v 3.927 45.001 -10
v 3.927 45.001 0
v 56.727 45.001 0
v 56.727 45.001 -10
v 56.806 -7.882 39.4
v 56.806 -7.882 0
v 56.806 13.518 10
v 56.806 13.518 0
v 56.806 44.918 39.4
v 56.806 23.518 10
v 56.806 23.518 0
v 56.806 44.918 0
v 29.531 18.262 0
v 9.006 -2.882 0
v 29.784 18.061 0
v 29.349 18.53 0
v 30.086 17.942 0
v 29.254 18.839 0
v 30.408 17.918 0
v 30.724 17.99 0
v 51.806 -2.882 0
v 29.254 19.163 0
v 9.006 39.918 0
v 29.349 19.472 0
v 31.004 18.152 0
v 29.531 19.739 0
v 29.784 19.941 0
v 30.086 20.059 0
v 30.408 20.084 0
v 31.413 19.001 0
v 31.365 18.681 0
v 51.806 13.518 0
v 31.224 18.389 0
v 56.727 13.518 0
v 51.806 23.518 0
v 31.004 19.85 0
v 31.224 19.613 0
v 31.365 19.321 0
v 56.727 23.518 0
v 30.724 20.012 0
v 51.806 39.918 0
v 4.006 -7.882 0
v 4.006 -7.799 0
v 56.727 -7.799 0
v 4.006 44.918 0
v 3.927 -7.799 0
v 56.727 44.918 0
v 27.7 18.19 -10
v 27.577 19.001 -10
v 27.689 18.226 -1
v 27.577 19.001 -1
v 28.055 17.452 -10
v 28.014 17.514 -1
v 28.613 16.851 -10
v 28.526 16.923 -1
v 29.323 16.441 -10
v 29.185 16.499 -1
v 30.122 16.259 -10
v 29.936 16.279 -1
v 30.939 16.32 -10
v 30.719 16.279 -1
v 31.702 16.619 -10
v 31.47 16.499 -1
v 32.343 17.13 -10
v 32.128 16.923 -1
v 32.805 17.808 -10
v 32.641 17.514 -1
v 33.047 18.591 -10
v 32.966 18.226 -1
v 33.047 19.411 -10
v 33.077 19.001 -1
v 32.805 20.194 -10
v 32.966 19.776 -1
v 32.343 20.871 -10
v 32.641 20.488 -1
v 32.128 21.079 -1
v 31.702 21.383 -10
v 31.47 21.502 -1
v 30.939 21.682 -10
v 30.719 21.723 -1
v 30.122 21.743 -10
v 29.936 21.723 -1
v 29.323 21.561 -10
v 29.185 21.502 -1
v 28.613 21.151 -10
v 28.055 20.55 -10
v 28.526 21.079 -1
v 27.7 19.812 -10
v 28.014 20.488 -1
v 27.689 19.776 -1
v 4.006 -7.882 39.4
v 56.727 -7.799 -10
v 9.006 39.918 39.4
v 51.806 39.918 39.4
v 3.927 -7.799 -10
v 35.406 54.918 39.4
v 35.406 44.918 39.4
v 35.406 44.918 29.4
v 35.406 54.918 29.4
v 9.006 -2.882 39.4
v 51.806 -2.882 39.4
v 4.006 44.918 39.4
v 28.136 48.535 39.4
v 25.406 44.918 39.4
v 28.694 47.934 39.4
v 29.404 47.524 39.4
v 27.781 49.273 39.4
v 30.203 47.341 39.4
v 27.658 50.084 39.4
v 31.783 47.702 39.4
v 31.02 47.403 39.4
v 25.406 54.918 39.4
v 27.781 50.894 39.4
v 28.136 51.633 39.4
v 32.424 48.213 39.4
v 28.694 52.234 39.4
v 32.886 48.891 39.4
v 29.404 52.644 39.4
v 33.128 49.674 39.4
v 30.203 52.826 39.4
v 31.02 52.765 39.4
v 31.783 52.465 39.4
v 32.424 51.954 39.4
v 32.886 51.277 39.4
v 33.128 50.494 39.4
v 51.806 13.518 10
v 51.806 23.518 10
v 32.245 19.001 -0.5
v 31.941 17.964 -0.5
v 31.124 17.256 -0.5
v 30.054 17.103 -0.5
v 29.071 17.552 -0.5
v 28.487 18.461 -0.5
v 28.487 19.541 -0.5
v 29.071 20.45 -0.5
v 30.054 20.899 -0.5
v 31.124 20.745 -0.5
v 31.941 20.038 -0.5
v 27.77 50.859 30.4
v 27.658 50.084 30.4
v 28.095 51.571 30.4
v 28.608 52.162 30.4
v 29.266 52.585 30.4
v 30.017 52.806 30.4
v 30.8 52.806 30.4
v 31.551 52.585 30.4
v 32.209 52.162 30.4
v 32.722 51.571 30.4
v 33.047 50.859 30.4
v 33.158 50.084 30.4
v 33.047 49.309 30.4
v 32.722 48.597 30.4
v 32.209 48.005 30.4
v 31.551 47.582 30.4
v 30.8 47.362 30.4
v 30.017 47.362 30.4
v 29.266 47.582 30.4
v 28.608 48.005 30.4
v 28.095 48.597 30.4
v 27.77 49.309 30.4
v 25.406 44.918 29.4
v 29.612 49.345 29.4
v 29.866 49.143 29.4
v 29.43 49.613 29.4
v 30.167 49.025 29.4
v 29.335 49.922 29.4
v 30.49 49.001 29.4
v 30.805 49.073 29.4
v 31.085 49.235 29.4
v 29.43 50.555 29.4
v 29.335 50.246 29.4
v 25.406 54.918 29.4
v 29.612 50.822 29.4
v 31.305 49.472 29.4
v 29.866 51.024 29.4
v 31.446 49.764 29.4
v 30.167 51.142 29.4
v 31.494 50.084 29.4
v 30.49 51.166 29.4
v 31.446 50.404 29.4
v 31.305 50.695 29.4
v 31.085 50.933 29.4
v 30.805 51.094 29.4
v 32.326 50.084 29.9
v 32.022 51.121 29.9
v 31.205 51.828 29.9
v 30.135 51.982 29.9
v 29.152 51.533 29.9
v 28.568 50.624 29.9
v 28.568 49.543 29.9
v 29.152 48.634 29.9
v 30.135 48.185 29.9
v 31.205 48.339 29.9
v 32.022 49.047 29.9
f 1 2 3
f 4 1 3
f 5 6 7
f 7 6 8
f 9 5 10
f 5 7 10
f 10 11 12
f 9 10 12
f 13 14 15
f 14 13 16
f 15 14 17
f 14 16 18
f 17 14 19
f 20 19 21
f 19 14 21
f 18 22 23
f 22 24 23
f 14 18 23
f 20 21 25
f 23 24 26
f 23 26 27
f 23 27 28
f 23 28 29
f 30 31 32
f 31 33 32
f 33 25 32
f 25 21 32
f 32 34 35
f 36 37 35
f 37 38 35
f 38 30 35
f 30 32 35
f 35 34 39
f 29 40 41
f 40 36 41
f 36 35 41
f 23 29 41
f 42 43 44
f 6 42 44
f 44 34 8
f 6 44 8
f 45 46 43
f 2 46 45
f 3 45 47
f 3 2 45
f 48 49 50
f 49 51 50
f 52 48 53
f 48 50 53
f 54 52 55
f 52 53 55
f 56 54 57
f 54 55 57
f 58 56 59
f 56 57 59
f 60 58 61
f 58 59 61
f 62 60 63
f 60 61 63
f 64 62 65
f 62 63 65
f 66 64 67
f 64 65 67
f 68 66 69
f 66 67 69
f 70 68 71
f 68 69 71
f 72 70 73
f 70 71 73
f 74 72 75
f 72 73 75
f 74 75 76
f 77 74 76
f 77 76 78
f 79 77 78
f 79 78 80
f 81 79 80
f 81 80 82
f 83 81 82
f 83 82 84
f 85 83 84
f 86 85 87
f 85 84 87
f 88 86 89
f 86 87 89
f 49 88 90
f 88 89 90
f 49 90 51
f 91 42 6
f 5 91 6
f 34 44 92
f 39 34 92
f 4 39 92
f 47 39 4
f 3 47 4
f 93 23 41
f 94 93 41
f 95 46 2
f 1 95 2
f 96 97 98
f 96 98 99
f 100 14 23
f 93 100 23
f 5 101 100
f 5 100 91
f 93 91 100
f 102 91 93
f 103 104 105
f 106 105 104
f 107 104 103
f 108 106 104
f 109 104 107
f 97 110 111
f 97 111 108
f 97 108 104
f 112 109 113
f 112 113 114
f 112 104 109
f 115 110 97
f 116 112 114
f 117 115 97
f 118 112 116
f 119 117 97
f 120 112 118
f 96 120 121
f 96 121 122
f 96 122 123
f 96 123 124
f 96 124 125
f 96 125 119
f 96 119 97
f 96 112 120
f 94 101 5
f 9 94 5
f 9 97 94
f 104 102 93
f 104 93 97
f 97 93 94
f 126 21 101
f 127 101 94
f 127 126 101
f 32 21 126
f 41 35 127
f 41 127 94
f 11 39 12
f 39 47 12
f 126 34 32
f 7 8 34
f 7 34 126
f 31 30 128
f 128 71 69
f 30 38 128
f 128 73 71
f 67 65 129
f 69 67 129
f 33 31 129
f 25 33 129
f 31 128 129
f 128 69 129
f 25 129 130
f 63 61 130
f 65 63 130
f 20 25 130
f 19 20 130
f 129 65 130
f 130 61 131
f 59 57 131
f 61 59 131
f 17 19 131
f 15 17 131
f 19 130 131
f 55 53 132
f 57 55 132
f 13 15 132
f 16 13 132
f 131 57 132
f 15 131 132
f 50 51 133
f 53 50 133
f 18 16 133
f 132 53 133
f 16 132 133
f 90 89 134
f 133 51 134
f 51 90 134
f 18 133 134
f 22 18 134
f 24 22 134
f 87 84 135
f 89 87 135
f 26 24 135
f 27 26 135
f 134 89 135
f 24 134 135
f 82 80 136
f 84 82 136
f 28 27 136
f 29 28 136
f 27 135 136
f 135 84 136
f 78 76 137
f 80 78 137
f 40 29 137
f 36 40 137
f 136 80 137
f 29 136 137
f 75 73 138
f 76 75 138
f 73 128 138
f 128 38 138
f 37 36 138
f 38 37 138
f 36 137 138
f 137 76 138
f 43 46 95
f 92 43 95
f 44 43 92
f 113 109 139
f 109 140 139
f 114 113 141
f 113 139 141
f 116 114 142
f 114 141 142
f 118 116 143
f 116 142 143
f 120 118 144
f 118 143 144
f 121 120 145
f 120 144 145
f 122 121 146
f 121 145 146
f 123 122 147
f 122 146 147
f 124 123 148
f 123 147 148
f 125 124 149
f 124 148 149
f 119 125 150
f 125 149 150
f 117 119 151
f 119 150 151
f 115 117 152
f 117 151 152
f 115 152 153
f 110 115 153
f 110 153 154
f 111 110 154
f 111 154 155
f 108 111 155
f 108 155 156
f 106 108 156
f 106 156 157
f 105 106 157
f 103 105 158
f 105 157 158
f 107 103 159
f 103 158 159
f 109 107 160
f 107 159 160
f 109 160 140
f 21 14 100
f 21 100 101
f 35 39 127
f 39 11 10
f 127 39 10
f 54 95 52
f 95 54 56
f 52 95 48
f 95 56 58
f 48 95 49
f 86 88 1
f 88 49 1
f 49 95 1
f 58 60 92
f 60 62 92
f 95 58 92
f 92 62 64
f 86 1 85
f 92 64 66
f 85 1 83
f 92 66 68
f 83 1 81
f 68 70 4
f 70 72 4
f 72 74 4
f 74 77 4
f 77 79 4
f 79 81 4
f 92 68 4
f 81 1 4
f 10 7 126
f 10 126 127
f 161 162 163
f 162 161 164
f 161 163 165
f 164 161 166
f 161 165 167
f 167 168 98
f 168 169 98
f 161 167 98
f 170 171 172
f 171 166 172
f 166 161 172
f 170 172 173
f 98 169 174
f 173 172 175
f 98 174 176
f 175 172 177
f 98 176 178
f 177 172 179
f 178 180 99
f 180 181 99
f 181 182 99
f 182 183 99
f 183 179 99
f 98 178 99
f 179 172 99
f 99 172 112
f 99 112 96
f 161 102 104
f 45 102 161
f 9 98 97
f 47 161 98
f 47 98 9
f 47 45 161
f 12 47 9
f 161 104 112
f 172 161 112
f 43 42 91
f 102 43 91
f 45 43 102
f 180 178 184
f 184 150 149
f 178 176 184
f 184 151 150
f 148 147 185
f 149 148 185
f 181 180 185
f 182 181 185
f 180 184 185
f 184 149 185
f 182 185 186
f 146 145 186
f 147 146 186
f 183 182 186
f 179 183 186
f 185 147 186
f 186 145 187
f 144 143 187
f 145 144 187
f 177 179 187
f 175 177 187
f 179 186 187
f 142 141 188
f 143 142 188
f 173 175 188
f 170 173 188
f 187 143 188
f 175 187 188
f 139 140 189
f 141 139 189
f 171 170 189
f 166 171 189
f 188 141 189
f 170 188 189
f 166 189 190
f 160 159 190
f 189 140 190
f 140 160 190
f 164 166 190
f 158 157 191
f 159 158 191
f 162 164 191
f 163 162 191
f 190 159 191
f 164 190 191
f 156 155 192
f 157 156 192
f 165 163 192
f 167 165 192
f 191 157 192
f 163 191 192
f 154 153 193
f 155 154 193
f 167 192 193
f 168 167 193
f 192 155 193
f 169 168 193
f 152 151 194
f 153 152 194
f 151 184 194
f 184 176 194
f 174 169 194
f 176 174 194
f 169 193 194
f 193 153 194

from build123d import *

# Parameters (mm, degrees)
F0_W      = 52.8
F0_H      = 52.8
F0_W_2    = 42.8
F0_H_2    = 42.8
F1_DEPTH  = 39.4
F2_W      = 52.8
F2_H      = 52.8
F3_DEPTH  = 10
F4_W      = 10
F4_H      = 10
F5_DEPTH  = 25
F6_W      = 10
F6_H      = 10
F7_DEPTH  = 10
F9_D      = 5.5
F9_DEPTH  = 9
F9_TIP    = 1.6523667023
F11_D     = 5.5
F11_DEPTH = 9
F11_TIP   = 1.6523667023


with BuildPart() as f1:
    # F0 (on Top) → F1 (new body)
    with BuildSketch(Plane.XY):
        with Locations((30.4056062862, 18.5175239619)):
            Rectangle(F0_W, F0_H)
        with Locations((30.4056062862, 18.5175239619)):
            Rectangle(F0_W_2, F0_H_2, mode=Mode.SUBTRACT)
    extrude(amount=F1_DEPTH)

    # F2 (on Top) → F3 (join)
    with BuildSketch(Plane.XY):
        with Locations((30.3273436148, 18.6009341)):
            Rectangle(F2_W, F2_H)
    extrude(amount=-F3_DEPTH)

    # F4 (on face) → F5 (cut)
    with BuildSketch(Plane.YZ.offset(56.8056062862)):
        with Locations((18.5175239619, 5)):
            Rectangle(F4_W, F4_H)
    extrude(amount=-F5_DEPTH, mode=Mode.SUBTRACT)

    # F6 (on face) → F7 (join)
    with BuildSketch(Plane.XY.offset(39.4)):
        with Locations((30.4056062862, 49.9175239619)):
            Rectangle(F6_W, F6_H)
    extrude(amount=-F7_DEPTH)

    # F9
    with Locations(Plane.XY.offset(39.4)):
        with Locations((30.4083697991, 50.0837391585)):
            Hole(F9_D / 2, depth=F9_DEPTH)
            with Locations((0, 0, -(F9_DEPTH + F9_TIP / 2))):  # 118° drill point
                Cone(0, F9_D / 2, F9_TIP, mode=Mode.SUBTRACT)

    # F11
    with Locations(Plane(origin=(0, 0, -10), x_dir=(1, 0, 0), z_dir=(0, 0, -1))):
        with Locations((30.3273436148, -19.0009341)):
            Hole(F11_D / 2, depth=F11_DEPTH)
            with Locations((0, 0, -(F11_DEPTH + F11_TIP / 2))):  # 118° drill point
                Cone(0, F11_D / 2, F11_TIP, mode=Mode.SUBTRACT)


solid = f1.part
